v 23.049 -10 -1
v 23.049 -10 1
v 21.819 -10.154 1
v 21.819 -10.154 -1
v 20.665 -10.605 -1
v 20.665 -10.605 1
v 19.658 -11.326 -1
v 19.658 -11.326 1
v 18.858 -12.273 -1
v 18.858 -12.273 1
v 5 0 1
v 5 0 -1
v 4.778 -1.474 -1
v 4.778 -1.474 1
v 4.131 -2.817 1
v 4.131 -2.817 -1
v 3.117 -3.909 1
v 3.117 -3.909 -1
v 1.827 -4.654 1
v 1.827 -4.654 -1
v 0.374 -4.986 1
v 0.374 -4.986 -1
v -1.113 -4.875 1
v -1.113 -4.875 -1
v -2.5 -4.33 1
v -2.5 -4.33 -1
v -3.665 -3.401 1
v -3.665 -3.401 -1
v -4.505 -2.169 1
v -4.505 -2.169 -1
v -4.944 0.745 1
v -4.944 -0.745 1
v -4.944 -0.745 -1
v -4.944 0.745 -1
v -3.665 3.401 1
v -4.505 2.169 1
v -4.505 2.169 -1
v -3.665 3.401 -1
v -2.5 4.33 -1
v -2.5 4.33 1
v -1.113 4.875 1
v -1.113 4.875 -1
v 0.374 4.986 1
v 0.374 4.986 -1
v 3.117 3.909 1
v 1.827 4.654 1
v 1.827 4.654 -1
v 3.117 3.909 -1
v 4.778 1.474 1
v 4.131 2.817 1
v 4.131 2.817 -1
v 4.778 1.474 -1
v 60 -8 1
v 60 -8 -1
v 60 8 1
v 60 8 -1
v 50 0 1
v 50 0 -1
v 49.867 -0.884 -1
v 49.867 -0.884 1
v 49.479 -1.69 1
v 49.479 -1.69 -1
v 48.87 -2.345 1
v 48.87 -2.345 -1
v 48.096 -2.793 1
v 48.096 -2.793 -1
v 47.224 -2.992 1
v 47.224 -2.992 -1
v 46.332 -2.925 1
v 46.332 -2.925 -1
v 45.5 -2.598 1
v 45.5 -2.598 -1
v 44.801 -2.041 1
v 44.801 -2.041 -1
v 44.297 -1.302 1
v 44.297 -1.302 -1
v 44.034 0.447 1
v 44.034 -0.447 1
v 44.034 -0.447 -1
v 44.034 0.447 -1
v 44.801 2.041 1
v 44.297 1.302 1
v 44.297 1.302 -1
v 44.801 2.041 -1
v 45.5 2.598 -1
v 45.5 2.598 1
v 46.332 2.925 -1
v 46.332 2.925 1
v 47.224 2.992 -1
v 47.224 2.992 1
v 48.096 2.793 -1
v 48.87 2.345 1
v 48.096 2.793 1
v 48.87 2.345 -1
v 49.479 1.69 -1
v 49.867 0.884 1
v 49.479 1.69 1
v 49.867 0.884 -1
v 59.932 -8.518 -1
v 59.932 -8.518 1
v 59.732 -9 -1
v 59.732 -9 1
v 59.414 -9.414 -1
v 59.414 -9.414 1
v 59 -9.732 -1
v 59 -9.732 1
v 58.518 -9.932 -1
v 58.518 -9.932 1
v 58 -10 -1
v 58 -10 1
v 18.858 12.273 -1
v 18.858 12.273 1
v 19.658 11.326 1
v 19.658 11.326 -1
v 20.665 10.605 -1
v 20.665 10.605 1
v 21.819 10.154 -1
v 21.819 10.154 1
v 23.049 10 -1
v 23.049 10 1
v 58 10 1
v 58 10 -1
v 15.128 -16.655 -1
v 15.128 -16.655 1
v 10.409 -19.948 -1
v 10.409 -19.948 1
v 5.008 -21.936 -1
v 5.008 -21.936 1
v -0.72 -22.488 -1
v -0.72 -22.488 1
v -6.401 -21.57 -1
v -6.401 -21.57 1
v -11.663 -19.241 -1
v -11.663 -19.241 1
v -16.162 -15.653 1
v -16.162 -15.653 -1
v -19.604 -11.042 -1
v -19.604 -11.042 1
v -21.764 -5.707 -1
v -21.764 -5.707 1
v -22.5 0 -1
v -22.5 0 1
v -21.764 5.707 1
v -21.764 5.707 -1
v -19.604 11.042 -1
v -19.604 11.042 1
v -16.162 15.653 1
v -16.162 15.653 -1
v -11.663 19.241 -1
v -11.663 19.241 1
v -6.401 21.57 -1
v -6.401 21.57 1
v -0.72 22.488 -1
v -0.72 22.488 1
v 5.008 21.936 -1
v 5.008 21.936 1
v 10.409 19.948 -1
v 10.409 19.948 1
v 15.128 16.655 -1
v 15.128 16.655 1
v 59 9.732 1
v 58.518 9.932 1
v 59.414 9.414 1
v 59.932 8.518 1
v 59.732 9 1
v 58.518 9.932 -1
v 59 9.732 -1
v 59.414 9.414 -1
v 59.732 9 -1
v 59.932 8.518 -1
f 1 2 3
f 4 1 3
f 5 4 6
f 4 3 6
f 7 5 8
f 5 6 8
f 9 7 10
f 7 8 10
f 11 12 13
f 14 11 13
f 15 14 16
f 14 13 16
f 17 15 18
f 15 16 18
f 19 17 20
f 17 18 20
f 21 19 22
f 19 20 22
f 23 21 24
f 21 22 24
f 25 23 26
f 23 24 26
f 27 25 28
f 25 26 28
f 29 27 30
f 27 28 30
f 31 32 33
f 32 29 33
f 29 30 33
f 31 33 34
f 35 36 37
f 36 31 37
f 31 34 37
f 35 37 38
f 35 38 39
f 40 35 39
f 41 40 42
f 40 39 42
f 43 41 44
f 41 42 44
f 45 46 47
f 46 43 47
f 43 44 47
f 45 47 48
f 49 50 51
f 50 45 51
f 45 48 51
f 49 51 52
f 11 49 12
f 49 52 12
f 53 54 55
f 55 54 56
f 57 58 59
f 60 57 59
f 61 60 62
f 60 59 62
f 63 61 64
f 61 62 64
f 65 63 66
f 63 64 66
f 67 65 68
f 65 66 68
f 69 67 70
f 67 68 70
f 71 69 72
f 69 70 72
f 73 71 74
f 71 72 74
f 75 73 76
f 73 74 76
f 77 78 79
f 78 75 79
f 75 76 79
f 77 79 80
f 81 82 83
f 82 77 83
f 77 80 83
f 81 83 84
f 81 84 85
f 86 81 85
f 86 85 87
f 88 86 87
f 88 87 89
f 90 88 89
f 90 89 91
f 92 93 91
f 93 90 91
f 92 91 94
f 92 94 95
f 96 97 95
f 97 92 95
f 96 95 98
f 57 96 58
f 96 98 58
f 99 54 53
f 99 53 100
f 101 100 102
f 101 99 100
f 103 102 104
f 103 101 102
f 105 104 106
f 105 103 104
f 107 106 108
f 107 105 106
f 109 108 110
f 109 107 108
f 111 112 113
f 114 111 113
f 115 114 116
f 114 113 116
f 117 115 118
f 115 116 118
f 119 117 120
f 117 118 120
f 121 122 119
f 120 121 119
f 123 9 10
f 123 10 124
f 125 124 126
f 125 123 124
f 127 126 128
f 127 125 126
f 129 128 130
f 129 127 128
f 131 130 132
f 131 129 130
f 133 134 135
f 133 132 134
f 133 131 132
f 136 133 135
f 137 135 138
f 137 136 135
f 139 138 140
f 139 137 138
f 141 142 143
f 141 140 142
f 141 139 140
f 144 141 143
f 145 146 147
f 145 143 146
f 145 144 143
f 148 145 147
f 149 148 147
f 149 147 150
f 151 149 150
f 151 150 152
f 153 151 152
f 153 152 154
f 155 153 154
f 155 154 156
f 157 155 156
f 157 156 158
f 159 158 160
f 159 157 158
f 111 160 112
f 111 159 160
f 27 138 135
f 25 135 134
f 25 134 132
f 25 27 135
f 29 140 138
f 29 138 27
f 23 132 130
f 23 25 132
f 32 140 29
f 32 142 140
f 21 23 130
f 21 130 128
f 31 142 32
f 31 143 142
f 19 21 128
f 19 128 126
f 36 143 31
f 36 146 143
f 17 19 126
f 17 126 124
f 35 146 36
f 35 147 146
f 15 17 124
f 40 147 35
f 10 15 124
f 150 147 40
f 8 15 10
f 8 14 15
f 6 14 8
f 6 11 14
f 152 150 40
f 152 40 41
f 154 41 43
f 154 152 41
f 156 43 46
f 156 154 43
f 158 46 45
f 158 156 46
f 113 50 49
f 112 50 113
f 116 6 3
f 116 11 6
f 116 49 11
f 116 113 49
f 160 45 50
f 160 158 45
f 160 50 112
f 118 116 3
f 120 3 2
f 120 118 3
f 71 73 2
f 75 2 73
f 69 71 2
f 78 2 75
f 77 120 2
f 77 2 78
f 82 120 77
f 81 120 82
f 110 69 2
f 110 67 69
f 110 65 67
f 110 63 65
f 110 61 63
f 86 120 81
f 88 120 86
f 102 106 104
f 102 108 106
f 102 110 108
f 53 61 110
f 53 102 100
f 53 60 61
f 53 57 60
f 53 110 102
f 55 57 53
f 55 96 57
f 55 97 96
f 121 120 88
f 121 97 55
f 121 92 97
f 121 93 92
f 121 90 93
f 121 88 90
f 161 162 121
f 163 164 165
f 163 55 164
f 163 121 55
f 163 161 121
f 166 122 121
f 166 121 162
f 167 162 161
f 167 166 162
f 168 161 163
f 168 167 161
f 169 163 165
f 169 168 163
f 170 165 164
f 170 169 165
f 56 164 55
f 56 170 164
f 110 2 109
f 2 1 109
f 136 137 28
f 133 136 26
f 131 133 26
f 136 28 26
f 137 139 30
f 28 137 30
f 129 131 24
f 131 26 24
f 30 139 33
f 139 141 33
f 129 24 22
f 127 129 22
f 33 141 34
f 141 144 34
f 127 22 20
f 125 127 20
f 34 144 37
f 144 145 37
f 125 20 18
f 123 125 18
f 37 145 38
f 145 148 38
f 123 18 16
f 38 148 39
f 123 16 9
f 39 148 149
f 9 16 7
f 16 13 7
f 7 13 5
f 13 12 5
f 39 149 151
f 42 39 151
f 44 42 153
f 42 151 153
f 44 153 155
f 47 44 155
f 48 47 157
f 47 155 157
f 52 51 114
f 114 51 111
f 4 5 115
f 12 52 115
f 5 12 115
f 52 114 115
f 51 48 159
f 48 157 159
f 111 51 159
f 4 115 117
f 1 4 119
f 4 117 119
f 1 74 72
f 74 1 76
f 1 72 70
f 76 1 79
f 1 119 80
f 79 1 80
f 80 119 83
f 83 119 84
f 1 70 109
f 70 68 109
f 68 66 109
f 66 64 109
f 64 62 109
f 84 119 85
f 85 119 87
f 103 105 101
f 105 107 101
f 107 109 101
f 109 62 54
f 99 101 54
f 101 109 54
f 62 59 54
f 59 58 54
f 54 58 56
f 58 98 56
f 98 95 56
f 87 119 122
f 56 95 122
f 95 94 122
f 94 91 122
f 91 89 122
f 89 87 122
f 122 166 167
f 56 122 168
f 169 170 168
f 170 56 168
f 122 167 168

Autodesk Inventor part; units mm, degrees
ref_plane "YZ Plane" through (0, 0, 0) normal (1, 0, 0) x (0, 1, 0)
ref_plane "XZ Plane" through (0, 0, 0) normal (0, 1, 0) x (-1, 0, 0)
ref_plane "XY Plane" through (0, 0, 0) normal (0, 0, 1) x (1, 0, 0)
sketch "Sketch1" plane through (0, 0, 0) normal (0, 0, 1) x (1, 0, 0)
  circle A0 centre (0, 0) radius 22.5
  line L0 (162.5, 0) -> (-22.5, 0) construction
  circle A1 centre (0, 0) radius 5
  line L1 (60, 10) -> (20.1556, 10)
  line L2 (20.1556, 10) -> (20.1556, -10)
  line L3 (20.1556, -10) -> (60, -10)
  line L4 (60, -10) -> (60, 10)
  circle A2 centre (47, 0) radius 3
  point P0 (6.3, 21.6)
  point P1 (60, 0)
  dimension "d0" = 45
  dimension "d3" = 10
  dimension "d7" = 20
  dimension "d8" = 60
  dimension "d9" = 6
  dimension "d10" = 13
extrude "Extrusion1" add sketch "Sketch1" along normal mid plane 2
fillet "Fillet1" radius 5 2 edges at (20.1556, 10, 0) (20.1556, -10, 0)
fillet "Fillet2" radius 2 2 edges at (60, -10, 0) (60, 10, 0)
properties part number "stelscharnier onderkant" material "Stainless Steel"
